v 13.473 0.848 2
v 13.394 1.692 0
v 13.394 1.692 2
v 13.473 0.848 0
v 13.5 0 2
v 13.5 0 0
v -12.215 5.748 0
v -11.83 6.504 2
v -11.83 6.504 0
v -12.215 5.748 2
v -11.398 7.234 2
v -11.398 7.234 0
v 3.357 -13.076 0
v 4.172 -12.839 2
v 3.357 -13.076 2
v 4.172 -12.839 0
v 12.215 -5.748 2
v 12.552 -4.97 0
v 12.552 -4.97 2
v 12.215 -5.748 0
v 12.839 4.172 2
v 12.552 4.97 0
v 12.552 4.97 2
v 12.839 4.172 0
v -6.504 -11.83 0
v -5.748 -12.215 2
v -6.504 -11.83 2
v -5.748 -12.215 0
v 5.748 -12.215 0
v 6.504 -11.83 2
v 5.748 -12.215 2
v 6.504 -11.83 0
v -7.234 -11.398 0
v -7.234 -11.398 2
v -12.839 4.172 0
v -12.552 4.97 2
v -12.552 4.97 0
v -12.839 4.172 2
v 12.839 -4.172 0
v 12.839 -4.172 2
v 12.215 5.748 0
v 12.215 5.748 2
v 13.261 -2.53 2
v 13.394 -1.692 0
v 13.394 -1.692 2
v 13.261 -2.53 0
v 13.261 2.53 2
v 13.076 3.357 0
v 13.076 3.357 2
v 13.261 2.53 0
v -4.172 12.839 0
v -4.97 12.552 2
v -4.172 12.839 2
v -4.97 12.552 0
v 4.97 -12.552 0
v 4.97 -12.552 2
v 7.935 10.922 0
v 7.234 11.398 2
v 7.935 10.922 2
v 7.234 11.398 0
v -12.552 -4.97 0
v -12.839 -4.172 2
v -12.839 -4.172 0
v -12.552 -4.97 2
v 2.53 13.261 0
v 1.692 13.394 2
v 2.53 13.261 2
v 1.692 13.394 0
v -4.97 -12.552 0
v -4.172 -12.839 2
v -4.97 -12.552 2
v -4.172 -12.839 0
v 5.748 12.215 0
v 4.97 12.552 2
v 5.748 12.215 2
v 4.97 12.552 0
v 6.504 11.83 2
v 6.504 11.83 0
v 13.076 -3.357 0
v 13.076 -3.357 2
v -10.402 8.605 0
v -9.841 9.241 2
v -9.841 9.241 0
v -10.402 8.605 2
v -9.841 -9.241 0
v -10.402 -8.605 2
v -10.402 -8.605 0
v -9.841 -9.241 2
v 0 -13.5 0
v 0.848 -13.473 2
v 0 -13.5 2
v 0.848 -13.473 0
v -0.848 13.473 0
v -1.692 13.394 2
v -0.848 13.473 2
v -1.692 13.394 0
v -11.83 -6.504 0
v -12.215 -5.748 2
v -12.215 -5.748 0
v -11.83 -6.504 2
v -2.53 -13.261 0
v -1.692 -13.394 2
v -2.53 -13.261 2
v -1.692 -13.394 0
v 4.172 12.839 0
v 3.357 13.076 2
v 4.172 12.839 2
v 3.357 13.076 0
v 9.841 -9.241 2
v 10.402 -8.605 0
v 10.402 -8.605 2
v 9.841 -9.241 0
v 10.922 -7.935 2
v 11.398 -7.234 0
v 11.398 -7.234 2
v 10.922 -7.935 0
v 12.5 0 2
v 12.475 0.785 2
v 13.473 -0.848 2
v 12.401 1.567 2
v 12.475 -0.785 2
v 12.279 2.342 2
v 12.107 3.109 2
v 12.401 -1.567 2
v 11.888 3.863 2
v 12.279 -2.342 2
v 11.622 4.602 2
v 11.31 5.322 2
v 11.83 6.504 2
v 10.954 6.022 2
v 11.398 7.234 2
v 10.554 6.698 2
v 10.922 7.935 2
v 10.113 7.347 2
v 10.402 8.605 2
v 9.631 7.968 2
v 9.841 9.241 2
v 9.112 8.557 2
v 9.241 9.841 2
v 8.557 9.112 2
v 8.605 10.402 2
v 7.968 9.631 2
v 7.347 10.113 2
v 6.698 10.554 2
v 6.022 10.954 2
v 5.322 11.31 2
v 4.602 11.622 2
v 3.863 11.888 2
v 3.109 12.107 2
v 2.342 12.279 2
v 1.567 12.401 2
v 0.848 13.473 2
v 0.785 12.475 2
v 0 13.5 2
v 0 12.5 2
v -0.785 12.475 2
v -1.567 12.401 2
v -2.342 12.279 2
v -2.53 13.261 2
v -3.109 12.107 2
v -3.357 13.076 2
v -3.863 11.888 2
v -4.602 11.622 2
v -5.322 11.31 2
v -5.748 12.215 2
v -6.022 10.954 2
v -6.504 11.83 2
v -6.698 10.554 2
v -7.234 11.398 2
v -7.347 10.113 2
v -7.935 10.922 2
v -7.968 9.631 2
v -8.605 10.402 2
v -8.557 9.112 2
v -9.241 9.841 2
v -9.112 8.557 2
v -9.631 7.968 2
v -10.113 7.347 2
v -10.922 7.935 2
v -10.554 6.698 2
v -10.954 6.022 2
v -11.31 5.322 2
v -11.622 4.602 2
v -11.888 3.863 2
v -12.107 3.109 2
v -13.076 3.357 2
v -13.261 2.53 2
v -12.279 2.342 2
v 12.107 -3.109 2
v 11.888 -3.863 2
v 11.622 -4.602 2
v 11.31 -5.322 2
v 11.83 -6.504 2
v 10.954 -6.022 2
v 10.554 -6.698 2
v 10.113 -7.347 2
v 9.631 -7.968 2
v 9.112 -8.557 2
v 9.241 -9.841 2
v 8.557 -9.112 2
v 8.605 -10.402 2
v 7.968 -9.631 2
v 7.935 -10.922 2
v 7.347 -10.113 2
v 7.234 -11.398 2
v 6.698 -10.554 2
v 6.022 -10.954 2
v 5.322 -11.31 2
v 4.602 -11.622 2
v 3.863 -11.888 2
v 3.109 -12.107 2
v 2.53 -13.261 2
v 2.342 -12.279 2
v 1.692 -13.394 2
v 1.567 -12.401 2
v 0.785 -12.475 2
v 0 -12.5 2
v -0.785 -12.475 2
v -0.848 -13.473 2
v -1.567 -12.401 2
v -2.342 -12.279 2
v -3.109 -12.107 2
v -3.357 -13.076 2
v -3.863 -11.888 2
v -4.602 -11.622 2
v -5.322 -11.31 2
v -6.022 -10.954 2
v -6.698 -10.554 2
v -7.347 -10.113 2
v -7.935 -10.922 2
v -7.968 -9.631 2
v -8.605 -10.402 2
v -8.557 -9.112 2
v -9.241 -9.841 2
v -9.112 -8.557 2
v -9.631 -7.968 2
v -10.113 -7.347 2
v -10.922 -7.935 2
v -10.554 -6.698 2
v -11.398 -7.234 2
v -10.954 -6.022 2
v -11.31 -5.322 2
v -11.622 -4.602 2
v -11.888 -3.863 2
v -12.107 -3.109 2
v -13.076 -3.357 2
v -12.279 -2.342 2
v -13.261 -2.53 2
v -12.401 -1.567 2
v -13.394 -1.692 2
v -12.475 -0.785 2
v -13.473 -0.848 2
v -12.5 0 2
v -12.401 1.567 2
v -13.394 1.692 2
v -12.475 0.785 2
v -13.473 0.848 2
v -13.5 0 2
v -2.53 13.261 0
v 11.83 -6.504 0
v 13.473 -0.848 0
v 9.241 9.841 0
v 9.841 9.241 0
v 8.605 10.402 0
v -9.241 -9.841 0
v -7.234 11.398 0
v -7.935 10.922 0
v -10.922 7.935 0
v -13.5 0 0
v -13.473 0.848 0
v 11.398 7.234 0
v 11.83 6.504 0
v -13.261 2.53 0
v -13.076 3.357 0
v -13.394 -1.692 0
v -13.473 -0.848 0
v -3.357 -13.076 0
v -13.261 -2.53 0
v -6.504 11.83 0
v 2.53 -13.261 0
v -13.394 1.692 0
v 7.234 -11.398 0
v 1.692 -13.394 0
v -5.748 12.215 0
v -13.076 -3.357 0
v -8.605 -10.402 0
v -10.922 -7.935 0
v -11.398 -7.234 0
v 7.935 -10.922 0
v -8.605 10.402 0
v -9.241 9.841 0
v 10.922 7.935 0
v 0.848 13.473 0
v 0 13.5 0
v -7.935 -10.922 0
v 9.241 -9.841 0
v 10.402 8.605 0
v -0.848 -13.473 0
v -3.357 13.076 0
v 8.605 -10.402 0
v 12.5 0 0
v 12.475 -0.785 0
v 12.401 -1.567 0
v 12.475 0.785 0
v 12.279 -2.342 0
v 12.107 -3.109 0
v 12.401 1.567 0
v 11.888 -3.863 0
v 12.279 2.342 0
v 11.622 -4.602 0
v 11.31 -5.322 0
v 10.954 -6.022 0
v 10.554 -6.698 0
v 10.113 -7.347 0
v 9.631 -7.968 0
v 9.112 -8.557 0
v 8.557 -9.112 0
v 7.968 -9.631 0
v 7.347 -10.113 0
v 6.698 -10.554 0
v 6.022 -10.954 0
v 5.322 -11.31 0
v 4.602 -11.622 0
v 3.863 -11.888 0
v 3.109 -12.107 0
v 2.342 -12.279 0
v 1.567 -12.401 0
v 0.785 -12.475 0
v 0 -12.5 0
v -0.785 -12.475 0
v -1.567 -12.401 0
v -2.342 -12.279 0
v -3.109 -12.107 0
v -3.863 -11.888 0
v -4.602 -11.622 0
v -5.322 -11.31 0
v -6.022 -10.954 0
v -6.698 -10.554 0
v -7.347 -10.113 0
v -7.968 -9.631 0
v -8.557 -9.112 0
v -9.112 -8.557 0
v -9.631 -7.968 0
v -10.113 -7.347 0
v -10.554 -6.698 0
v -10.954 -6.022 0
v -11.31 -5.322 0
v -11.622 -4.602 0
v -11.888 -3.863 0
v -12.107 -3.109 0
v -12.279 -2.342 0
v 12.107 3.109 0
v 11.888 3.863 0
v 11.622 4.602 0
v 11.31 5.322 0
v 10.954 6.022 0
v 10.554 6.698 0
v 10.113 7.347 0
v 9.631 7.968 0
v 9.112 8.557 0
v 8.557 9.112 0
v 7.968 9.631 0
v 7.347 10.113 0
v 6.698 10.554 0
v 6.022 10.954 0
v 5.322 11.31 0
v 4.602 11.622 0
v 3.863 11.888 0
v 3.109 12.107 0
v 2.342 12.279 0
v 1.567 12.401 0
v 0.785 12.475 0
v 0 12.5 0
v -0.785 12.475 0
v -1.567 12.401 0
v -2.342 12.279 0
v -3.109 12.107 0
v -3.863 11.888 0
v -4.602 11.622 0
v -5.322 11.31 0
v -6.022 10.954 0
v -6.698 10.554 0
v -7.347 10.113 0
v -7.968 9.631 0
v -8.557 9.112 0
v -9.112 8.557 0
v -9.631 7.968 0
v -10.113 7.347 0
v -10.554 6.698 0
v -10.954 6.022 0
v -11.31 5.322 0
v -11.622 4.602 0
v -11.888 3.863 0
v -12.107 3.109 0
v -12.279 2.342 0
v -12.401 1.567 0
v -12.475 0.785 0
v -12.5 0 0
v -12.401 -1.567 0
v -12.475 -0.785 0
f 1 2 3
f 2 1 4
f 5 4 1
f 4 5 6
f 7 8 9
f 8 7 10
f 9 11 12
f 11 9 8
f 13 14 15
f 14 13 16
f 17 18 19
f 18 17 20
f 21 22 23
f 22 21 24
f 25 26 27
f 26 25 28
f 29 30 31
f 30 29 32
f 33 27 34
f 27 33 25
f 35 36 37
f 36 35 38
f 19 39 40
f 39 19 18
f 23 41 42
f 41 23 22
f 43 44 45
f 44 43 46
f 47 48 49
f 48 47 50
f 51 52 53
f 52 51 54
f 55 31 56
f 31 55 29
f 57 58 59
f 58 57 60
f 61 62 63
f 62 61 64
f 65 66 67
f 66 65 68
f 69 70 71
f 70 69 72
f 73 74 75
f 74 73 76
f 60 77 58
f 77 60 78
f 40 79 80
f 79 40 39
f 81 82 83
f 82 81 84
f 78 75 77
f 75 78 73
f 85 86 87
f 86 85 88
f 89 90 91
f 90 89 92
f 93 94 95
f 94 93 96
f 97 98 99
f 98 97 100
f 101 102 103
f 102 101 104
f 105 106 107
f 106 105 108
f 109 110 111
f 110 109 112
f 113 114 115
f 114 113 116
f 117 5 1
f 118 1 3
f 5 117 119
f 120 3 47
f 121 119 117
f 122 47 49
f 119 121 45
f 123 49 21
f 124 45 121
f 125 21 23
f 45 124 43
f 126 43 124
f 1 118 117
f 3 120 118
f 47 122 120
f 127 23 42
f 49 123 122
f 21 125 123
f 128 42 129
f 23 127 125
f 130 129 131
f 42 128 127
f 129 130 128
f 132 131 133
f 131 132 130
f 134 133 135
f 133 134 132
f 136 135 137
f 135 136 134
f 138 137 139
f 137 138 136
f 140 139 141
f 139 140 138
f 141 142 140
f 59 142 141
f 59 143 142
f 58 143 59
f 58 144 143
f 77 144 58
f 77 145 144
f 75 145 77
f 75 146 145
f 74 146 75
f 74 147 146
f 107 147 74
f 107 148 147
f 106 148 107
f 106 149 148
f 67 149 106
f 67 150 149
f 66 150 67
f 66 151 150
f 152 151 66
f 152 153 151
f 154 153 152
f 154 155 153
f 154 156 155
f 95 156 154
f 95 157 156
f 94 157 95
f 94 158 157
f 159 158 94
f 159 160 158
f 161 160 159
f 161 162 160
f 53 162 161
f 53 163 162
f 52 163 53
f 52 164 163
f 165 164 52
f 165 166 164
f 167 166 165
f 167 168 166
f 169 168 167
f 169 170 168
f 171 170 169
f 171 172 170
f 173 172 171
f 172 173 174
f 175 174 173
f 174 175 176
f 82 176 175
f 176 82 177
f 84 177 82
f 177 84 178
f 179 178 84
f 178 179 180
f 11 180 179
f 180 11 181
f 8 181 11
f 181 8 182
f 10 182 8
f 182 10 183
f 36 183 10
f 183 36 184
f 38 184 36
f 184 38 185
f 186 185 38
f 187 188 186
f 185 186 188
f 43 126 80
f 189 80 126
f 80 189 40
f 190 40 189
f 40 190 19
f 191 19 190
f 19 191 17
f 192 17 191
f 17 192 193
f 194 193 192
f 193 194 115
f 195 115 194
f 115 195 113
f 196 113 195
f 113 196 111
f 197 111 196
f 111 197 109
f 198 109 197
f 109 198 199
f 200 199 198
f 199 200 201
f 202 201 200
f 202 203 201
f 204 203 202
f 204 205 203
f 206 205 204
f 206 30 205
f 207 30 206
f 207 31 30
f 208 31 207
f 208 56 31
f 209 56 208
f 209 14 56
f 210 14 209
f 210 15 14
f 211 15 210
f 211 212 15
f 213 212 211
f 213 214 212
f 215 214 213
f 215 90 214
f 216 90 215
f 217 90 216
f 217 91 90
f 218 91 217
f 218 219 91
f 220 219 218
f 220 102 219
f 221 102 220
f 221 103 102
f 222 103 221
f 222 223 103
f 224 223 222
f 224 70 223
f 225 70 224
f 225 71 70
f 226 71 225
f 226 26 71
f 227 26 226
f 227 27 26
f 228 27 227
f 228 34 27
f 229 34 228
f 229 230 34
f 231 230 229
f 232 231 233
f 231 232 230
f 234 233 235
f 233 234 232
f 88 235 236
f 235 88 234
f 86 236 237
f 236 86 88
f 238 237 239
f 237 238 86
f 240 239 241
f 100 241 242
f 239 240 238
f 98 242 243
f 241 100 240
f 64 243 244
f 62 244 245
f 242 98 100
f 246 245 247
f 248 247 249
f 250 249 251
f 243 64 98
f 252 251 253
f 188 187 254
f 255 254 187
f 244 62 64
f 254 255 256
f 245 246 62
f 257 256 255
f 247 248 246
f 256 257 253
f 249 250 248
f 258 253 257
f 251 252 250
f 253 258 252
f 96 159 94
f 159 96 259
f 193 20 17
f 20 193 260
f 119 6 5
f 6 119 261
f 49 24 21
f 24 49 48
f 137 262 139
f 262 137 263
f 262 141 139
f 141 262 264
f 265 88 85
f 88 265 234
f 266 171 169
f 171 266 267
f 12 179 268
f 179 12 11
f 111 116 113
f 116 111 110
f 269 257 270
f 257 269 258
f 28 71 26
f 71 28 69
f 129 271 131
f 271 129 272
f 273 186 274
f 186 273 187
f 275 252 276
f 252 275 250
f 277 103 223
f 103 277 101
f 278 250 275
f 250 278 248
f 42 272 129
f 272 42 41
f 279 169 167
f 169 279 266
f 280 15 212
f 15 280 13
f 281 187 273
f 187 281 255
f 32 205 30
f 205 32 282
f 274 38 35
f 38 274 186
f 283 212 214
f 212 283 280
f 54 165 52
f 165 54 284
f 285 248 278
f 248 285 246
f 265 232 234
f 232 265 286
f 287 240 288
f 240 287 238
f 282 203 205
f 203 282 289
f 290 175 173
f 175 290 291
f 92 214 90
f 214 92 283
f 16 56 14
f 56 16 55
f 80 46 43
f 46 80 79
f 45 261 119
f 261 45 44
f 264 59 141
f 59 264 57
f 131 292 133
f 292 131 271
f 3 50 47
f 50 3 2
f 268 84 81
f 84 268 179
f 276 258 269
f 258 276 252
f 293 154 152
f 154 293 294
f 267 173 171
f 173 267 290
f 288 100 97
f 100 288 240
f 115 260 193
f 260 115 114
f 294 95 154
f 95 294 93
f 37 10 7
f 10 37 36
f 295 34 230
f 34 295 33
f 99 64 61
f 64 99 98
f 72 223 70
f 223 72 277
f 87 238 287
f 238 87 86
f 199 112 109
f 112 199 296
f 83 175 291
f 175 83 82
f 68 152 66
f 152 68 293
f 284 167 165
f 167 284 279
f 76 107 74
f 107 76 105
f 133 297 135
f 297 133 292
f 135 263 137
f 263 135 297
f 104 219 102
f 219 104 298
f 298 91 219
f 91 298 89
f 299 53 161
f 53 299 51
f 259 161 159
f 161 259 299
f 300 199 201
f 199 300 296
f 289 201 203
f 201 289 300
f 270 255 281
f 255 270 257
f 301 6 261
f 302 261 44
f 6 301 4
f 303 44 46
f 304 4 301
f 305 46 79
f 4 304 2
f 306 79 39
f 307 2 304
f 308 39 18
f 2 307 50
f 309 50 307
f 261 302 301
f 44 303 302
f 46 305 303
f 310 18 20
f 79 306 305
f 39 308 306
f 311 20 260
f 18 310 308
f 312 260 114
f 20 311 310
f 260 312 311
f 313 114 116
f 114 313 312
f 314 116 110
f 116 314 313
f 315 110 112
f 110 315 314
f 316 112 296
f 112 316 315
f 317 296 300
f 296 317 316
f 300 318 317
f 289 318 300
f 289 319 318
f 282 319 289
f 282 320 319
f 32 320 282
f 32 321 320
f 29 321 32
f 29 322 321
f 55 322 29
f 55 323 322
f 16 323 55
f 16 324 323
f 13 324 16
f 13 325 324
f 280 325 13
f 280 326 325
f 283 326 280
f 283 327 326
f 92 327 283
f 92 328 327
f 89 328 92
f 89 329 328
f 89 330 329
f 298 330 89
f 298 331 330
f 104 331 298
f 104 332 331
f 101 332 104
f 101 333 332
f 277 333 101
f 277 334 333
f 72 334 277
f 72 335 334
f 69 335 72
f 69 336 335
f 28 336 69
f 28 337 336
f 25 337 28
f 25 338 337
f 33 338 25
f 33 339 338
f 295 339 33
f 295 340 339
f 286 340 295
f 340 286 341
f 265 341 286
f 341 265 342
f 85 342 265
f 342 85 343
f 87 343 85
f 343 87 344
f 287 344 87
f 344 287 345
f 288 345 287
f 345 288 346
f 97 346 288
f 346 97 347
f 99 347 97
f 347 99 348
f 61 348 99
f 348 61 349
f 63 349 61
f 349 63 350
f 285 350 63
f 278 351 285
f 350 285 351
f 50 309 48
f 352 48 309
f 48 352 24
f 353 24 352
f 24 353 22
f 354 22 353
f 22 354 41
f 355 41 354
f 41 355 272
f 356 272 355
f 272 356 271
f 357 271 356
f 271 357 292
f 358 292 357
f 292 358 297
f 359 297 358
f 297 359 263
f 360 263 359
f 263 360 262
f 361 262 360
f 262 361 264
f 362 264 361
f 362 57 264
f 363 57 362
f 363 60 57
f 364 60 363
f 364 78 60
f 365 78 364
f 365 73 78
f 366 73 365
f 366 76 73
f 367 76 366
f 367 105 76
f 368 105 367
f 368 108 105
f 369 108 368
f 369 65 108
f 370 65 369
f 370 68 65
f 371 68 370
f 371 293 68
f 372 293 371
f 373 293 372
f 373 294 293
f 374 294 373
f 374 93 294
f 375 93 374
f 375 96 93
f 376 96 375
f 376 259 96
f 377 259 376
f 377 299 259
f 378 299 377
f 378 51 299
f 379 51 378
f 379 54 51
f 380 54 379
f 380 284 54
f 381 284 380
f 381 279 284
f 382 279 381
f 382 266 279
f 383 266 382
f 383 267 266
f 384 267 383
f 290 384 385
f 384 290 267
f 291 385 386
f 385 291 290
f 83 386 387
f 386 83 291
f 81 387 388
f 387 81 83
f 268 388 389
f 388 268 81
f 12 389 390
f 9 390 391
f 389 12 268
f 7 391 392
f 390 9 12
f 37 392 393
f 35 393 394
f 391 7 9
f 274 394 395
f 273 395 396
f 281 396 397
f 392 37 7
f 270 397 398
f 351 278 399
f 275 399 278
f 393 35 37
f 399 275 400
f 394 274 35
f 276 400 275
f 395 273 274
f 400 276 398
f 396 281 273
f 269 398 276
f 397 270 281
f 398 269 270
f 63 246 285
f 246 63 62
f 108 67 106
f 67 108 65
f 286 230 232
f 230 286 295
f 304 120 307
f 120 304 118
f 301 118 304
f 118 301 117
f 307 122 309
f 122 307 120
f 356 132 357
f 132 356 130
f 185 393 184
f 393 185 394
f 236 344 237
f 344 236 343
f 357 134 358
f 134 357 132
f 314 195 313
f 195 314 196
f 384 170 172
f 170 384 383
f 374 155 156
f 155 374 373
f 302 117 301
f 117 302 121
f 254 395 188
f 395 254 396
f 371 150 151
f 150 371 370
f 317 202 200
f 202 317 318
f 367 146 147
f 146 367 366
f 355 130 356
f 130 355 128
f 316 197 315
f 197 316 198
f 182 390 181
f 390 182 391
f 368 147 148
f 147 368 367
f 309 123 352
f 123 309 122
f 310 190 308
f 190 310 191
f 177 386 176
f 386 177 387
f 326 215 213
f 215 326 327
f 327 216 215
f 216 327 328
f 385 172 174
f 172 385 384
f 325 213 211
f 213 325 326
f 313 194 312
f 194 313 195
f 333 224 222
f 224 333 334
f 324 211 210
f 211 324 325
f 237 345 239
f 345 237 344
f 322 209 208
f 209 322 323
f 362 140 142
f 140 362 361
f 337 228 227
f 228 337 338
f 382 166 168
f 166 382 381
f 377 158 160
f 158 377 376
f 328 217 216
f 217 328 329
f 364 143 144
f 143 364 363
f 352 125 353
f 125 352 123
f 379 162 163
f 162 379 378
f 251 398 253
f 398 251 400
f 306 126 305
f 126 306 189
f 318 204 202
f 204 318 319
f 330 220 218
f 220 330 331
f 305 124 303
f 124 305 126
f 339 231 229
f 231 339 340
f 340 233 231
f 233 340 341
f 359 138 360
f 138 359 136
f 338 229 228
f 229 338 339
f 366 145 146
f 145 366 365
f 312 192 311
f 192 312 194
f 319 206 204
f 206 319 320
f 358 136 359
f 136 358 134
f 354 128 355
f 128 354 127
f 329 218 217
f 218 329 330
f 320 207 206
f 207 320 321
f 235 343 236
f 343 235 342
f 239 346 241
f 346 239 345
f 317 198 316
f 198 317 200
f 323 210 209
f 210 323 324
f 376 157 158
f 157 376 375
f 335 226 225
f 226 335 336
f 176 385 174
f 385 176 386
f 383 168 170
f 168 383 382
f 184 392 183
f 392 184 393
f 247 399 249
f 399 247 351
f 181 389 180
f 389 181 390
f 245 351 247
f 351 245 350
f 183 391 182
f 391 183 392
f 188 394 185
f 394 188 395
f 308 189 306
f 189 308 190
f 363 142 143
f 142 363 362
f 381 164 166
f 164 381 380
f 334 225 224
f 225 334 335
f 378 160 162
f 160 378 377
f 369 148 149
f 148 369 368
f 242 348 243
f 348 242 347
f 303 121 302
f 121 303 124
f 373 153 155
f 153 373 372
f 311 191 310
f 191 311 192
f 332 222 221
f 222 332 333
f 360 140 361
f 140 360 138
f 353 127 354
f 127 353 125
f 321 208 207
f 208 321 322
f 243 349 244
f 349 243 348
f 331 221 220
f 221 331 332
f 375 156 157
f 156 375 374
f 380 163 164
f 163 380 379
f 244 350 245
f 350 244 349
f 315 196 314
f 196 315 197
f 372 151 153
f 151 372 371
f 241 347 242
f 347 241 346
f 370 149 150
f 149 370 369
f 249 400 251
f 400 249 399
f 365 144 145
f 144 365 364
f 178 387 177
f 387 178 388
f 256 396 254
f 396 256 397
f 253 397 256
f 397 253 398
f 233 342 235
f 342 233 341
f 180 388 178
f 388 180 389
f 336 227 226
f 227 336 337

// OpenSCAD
$fn=100;

difference(){
cylinder(r=13.5,h=2);
cylinder(r=12.5,h=15,center=true);
}
